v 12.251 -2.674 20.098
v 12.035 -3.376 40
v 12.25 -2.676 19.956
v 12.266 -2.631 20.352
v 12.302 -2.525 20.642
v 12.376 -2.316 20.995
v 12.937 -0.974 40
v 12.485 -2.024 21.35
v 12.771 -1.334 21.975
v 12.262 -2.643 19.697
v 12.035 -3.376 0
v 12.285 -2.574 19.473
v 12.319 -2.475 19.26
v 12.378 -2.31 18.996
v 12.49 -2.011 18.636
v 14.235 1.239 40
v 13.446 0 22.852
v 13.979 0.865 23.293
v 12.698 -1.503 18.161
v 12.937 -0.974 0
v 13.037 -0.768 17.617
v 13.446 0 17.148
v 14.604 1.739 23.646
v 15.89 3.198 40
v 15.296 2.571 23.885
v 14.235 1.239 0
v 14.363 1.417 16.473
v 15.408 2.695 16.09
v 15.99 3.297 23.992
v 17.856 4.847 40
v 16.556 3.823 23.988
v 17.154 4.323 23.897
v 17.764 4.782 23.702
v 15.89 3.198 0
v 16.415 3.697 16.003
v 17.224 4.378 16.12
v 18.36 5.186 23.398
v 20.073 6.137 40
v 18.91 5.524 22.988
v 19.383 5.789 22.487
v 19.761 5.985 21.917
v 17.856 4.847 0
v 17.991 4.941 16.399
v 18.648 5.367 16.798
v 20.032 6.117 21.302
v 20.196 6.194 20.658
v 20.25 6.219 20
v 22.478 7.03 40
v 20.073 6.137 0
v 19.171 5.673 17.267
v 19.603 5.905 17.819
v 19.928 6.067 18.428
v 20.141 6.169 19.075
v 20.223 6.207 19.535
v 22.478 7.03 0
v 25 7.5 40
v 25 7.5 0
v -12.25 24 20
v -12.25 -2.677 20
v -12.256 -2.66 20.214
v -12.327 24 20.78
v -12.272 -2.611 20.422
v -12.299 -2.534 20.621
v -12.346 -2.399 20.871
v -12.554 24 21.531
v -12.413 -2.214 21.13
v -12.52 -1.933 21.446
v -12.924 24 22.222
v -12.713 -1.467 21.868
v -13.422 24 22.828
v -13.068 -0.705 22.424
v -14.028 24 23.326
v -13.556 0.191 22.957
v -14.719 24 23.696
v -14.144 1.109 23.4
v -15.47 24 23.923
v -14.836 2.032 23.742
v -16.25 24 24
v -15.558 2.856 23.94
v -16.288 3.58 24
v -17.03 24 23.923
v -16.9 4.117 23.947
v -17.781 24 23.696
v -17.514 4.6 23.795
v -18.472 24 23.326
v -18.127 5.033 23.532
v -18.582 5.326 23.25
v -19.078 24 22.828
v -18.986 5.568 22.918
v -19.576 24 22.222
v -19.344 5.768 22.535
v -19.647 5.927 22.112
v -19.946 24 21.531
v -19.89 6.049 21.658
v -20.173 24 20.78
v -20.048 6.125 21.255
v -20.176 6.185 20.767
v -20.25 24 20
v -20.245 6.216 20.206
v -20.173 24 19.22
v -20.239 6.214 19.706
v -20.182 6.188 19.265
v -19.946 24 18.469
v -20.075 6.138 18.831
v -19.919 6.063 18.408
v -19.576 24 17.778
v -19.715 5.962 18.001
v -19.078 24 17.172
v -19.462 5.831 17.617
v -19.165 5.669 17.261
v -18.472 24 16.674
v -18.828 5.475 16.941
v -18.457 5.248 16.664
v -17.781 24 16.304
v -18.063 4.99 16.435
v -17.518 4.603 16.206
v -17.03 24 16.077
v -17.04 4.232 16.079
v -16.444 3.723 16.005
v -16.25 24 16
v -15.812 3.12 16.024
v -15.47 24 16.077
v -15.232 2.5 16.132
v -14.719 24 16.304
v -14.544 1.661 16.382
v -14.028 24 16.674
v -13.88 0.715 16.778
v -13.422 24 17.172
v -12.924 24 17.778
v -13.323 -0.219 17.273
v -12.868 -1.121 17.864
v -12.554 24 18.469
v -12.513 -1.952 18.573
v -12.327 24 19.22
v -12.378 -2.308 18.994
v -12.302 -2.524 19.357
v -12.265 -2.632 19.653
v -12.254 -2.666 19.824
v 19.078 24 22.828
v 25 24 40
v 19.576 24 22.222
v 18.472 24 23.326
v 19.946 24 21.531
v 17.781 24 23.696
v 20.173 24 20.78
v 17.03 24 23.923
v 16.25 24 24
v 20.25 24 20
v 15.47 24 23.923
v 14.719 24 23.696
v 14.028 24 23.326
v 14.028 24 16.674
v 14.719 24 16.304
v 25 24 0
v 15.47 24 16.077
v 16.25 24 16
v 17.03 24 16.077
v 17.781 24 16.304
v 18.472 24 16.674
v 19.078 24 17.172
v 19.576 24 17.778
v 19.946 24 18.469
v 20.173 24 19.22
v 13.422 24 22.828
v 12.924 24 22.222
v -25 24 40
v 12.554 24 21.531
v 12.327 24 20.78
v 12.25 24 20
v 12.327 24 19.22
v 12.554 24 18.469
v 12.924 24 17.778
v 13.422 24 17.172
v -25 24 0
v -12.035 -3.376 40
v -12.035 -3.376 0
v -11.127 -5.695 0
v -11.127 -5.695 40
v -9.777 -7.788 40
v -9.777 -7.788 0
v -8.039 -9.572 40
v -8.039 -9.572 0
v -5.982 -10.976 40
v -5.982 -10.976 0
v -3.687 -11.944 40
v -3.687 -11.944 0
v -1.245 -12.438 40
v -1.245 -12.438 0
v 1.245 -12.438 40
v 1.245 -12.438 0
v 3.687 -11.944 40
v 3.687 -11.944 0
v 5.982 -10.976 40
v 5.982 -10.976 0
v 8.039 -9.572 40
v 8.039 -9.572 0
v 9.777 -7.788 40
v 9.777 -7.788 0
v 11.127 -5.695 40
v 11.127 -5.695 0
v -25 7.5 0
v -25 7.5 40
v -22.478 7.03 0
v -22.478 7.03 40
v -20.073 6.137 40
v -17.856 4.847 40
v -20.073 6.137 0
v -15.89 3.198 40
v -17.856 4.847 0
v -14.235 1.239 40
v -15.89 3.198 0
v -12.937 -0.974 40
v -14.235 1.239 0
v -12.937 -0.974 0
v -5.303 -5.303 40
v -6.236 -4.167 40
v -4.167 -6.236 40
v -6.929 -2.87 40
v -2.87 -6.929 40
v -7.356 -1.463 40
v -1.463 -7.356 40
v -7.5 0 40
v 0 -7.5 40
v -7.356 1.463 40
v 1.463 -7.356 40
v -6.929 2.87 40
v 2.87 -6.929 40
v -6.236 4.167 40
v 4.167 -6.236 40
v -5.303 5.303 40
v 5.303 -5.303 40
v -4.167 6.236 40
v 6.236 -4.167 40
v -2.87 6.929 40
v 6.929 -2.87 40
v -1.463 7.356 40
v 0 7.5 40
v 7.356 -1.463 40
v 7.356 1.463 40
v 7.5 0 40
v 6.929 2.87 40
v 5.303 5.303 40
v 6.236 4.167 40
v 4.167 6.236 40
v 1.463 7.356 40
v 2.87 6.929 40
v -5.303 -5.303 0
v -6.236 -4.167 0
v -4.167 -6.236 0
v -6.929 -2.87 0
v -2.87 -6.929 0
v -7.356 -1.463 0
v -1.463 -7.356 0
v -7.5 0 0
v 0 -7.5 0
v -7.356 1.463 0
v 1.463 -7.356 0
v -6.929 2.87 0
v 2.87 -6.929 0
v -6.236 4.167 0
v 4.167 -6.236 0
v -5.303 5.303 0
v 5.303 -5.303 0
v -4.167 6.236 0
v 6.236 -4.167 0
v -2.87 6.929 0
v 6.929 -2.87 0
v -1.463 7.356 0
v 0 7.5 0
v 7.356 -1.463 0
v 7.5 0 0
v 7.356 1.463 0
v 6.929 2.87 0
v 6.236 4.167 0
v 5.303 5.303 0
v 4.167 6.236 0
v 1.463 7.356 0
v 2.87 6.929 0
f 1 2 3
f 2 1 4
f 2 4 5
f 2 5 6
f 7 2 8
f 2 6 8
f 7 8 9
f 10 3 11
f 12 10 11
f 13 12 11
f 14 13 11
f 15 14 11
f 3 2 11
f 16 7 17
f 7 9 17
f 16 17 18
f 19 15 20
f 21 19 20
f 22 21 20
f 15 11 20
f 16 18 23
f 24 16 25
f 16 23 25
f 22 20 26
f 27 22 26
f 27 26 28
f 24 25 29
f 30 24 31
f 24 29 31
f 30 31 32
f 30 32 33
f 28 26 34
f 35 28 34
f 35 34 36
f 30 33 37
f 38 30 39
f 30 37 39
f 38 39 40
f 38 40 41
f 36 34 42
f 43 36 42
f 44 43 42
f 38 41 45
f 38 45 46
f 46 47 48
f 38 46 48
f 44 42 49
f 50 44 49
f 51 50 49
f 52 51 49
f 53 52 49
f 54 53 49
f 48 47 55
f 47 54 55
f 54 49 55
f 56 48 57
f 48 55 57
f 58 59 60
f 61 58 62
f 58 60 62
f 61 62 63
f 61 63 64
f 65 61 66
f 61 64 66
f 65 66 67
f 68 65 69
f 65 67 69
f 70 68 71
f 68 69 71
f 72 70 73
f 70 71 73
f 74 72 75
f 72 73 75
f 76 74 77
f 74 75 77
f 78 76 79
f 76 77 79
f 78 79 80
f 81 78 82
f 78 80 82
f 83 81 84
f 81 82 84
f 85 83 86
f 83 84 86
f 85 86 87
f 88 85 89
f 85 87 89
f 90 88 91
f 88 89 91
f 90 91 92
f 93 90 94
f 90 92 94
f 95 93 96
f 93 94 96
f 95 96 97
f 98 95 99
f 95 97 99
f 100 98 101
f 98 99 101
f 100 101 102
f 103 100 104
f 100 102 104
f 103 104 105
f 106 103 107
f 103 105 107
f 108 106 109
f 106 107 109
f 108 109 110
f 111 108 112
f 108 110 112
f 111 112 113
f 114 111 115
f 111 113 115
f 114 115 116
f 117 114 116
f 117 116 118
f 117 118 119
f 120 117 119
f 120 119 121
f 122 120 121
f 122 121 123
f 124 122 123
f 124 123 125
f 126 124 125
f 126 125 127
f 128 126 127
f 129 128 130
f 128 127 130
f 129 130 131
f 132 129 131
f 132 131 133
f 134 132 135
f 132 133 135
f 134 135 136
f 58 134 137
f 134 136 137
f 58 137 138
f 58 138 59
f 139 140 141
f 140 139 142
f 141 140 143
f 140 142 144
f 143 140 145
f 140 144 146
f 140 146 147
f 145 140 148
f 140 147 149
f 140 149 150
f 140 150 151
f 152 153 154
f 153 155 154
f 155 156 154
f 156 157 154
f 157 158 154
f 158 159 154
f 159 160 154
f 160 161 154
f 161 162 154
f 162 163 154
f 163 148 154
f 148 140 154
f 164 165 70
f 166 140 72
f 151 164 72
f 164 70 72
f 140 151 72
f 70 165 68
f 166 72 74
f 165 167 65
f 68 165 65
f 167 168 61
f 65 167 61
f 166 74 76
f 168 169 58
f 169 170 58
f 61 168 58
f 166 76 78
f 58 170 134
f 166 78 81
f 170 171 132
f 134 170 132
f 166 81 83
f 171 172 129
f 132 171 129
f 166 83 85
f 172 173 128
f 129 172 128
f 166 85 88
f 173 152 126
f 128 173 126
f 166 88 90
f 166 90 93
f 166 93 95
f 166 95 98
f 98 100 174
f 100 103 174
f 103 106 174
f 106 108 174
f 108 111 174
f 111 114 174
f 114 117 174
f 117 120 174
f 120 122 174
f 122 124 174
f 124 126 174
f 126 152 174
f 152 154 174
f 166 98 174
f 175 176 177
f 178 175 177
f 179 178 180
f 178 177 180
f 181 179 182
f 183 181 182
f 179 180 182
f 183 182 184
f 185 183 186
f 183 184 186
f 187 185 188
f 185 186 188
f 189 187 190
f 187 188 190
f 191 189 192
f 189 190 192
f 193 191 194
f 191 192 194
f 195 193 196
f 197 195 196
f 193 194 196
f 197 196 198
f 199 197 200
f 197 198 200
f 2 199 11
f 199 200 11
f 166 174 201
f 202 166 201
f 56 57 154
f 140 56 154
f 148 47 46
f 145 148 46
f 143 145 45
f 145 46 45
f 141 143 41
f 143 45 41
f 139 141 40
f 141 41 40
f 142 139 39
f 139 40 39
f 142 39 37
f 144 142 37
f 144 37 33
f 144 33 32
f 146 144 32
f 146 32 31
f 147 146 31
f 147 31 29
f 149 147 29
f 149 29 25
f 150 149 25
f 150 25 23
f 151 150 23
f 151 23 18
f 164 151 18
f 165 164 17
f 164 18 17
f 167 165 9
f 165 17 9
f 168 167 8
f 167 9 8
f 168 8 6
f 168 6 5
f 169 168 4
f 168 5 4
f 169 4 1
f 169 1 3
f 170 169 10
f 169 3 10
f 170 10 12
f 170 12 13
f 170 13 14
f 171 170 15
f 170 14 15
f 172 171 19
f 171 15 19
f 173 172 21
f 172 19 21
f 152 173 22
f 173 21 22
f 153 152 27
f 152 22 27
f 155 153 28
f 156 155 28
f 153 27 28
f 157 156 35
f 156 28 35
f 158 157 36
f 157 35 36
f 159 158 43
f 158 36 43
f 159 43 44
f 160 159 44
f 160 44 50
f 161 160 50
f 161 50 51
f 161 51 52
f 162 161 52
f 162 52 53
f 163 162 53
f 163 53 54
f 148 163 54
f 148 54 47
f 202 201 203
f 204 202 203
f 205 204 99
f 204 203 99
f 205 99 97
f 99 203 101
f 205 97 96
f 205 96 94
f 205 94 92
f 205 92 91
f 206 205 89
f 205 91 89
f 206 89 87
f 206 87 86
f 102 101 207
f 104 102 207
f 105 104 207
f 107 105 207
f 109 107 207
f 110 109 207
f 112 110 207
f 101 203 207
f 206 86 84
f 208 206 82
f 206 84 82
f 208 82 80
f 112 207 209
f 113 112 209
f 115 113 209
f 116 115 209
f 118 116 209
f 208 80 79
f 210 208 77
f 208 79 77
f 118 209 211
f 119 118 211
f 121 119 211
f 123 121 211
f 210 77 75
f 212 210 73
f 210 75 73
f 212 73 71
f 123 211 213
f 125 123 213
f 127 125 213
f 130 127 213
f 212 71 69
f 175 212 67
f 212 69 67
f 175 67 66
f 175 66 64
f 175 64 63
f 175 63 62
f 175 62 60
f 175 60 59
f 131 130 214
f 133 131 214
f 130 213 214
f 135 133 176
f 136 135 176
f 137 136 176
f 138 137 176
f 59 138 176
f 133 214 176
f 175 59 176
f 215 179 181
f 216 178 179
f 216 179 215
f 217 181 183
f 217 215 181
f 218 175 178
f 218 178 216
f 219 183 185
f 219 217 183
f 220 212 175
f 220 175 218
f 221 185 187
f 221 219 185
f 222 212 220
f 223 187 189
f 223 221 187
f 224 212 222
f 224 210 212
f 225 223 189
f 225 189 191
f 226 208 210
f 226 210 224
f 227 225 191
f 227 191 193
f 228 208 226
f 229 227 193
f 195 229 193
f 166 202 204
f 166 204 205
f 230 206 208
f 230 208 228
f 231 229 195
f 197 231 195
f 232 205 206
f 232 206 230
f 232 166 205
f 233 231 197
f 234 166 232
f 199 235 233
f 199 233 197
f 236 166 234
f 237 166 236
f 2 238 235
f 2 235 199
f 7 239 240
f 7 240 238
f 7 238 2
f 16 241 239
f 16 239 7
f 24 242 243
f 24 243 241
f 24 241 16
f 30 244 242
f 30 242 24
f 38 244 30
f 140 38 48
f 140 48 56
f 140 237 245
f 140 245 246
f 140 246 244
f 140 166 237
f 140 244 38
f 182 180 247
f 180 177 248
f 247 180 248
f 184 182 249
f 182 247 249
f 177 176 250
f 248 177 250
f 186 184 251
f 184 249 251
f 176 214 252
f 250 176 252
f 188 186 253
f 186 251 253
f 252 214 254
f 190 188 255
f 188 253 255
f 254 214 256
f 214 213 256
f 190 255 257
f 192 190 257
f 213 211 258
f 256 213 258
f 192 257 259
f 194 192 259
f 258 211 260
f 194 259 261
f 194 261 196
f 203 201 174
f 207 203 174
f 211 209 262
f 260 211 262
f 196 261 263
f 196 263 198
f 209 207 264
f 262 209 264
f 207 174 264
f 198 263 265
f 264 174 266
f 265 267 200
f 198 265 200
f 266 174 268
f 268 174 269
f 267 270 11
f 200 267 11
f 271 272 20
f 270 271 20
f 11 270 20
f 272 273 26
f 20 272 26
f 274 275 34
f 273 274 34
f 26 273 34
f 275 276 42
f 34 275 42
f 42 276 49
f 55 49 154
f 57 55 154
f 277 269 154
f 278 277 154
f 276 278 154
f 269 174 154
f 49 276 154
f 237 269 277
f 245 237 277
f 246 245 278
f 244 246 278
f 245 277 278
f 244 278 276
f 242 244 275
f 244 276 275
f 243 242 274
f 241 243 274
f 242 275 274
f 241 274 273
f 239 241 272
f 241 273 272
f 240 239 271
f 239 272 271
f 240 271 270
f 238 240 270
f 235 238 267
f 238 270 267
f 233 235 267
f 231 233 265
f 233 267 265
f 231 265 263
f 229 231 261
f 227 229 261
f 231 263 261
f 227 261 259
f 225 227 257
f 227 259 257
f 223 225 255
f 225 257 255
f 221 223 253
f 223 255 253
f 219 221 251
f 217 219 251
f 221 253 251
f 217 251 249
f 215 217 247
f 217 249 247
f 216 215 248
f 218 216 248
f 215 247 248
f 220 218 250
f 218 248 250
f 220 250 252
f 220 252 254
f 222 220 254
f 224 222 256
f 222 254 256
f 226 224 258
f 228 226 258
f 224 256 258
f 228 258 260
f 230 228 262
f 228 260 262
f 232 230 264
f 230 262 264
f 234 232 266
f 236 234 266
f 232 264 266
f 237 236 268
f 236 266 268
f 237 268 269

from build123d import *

# Parameters (mm, degrees)
F1_DEPTH    = 40
F2_T1_DEPTH = 40
F3_R        = 4
F4_DEPTH    = 30


# Not quite as in the source:
# - a fillet or chamfer that OpenCascade refuses, or shapes differently, is made with other operations: its cross-section is extruded or revolved along the edge and cut away or added


with BuildPart() as f1:
    # F0 (on Top) → F1 (new body)
    with BuildSketch(Plane.XY):
        with BuildLine():
            Line((10, 7.5), (0, 7.5))
            Line((0, 7.5), (-10, 7.5))
            ThreePointArc((-10, 7.5), (-3.9528470752, -11.8585412256), (12.5, 0))
            ThreePointArc((12.5, 0), (11.8585412256, 3.9528470752), (10, 7.5))
        make_face()
        with BuildLine():
            ThreePointArc((0, 7.5), (5.3033008589, 5.3033008589), (7.5, 0))
            ThreePointArc((7.5, 0), (-5.3033008589, -5.3033008589), (0, 7.5))
        make_face(mode=Mode.SUBTRACT)
        with BuildLine():
            Line((0, 12.5), (0, 7.5))
            Line((0, 7.5), (10, 7.5))
            ThreePointArc((10, 7.5), (5.5901699437, 11.1803398875), (0, 12.5))
        make_face()
        with BuildLine():
            ThreePointArc((0, 12.5), (5.5901699437, 11.1803398875), (10, 7.5))
            Line((10, 7.5), (25, 7.5))
            Line((25, 7.5), (25, 24))
            Line((25, 24), (0, 24))
            Line((0, 24), (0, 12.5))
        make_face()
        with BuildLine():
            ThreePointArc((-10, 7.5), (-5.5901699437, 11.1803398875), (0, 12.5))
            Line((0, 12.5), (0, 24))
            Line((0, 24), (-25, 24))
            Line((-25, 24), (-25, 7.5))
            Line((-25, 7.5), (-10, 7.5))
        make_face()
        with BuildLine():
            Line((-10, 7.5), (0, 7.5))
            Line((0, 7.5), (0, 12.5))
            ThreePointArc((0, 12.5), (-5.5901699437, 11.1803398875), (-10, 7.5))
        make_face()
    extrude(amount=F1_DEPTH)

    # F2: fillet of radius 15 on 2 edges, made by hand

    # F2_s2 → F2_t1 (join)
    with BuildSketch(Plane.XY):
        with BuildLine():
            ThreePointArc((12.0354995182, -3.375907485), (16.8376373335, 4.064804959), (25, 7.5))
            Line((25, 7.5), (10, 7.5))
            ThreePointArc((10, 7.5), (12.2866655631, 2.2995324178), (12.0354995182, -3.375907485))
        make_face()
        with BuildLine():
            ThreePointArc((-25, 7.5), (-16.8376373335, 4.064804959), (-12.0354995182, -3.375907485))
            ThreePointArc((-12.0354995182, -3.375907485), (-12.2866655631, 2.2995324178), (-10, 7.5))
            Line((-10, 7.5), (-25, 7.5))
        make_face()
    extrude(amount=F2_T1_DEPTH)

    # F3 (on Front) → F4 (cut, symmetric)
    with BuildSketch(Plane.XZ):
        with Locations((16.25, 20)):
            Circle(F3_R)
        with Locations((-16.25, 20)):
            Circle(F3_R)
    extrude(amount=F4_DEPTH, both=True, mode=Mode.SUBTRACT)


solid = f1.part
